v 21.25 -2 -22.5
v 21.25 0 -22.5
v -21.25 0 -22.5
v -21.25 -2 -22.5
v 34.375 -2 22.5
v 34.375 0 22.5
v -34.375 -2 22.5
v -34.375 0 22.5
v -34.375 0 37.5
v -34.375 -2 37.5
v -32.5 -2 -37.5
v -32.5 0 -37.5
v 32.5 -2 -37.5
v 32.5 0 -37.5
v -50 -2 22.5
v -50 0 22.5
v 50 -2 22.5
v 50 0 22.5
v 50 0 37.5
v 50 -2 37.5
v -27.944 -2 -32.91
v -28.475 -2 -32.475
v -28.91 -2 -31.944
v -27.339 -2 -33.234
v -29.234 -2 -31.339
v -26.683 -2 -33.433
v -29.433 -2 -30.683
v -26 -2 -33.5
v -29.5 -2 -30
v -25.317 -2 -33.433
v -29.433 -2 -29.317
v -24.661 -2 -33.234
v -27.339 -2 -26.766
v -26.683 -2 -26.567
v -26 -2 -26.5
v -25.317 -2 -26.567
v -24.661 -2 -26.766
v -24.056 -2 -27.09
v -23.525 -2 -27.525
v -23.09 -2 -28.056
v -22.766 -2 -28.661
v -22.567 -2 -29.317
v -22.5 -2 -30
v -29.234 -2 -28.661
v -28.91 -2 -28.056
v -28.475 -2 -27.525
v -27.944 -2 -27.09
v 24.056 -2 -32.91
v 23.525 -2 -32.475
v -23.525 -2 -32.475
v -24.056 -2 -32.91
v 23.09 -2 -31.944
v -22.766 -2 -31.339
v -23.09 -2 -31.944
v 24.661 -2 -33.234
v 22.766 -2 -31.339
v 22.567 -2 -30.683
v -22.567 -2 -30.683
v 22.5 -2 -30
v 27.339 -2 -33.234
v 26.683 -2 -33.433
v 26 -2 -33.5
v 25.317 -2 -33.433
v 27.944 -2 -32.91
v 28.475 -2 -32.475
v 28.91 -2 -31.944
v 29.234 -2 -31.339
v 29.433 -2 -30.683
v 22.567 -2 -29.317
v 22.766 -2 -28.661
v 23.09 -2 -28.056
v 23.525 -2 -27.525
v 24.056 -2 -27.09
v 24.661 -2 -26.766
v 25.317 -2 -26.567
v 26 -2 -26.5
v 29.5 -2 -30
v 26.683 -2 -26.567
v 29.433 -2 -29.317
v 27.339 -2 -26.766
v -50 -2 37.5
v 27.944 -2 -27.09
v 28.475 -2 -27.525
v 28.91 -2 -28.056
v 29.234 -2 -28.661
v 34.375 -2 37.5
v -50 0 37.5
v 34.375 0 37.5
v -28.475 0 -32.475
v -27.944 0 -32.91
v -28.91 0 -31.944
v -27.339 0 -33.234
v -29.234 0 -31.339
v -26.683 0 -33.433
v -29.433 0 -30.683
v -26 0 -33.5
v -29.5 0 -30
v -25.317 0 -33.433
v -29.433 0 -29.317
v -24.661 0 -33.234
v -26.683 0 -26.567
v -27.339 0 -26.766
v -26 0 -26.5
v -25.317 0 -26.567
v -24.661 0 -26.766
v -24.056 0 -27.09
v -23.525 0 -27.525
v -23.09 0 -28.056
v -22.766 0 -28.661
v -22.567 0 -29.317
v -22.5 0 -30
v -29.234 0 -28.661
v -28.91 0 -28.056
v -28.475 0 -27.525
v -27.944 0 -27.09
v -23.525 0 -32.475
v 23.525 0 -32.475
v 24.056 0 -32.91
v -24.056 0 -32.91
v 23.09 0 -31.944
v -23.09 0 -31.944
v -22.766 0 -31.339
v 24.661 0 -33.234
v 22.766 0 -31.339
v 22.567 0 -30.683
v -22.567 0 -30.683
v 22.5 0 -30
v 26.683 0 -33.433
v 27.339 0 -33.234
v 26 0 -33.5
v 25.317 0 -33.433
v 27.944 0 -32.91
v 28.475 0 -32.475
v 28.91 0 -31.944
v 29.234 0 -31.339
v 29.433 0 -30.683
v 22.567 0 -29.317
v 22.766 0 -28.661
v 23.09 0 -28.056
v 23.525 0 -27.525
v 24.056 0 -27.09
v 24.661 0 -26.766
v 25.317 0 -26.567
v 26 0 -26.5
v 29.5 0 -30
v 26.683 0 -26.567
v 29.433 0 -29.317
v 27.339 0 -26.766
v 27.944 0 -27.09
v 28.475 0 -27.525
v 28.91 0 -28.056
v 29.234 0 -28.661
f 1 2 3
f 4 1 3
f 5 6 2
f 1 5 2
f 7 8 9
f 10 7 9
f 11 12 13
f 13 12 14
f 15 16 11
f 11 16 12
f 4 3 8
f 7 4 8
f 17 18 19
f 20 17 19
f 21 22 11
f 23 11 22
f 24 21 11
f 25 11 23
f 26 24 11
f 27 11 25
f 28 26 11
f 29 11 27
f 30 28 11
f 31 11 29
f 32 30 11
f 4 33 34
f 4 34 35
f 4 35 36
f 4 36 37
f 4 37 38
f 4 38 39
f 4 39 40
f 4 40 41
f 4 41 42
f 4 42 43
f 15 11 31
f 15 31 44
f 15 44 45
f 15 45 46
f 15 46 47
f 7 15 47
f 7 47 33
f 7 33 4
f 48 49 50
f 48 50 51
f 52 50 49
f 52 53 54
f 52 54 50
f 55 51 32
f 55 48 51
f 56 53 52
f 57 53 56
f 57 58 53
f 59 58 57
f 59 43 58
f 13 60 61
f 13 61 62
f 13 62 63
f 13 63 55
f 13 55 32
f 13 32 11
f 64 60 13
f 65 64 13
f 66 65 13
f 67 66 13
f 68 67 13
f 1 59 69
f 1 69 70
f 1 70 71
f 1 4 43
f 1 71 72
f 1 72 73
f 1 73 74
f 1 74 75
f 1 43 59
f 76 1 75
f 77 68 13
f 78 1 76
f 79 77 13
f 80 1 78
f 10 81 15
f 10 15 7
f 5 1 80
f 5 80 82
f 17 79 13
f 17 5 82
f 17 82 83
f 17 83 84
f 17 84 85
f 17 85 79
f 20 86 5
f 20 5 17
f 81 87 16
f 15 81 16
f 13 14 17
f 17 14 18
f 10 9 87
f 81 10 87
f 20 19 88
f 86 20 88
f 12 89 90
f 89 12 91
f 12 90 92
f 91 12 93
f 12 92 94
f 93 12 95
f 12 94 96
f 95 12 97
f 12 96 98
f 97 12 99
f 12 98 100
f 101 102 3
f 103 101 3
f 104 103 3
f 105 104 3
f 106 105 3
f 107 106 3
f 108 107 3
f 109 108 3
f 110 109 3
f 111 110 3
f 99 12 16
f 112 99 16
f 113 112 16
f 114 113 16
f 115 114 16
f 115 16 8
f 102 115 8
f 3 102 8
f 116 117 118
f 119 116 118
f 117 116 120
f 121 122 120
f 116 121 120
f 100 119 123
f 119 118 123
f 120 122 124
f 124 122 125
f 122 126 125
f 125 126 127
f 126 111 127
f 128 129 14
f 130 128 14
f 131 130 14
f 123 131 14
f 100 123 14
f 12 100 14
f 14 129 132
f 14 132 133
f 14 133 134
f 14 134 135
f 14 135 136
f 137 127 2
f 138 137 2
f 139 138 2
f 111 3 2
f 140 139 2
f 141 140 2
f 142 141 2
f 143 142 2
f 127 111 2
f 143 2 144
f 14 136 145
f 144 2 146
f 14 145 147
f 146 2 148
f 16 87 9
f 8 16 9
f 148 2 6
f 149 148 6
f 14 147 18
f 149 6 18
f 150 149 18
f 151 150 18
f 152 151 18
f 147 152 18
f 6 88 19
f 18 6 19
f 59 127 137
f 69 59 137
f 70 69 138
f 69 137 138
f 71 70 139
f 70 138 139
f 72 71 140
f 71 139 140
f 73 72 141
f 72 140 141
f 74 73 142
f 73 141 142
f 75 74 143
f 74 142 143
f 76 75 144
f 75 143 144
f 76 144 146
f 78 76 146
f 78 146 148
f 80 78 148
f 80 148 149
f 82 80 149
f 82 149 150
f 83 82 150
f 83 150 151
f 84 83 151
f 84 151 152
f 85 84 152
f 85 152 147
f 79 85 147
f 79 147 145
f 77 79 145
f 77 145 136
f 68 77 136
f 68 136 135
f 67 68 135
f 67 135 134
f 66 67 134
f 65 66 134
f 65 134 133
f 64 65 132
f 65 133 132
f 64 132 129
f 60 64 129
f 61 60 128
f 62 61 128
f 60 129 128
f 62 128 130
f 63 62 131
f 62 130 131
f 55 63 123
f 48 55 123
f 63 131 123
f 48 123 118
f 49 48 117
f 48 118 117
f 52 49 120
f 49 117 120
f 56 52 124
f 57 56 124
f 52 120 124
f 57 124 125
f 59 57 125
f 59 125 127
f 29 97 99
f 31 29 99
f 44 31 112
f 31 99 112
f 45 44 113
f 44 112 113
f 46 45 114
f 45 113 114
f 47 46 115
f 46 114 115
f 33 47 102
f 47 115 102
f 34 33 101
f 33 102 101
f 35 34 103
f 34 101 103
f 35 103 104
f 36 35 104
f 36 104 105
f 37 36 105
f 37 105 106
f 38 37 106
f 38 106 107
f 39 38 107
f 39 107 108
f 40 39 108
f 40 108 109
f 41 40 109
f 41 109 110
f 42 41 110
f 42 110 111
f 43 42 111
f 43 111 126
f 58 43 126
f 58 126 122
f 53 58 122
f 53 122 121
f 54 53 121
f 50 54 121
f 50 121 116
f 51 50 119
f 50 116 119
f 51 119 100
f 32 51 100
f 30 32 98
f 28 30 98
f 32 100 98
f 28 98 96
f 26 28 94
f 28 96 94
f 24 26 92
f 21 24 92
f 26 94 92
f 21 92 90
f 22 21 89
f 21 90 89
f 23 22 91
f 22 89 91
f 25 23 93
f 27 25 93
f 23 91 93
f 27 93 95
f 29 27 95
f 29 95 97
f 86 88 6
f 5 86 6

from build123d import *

# Parameters (mm, degrees)
F1_DEPTH = 2
F3_D     = 7


with BuildPart() as f1:
    # F0 (on Front) → F1 (new body)
    with BuildSketch(Plane.XZ):
        Polygon((-50, 22.5), (-32.5, -37.5), (32.5, -37.5), (50, 22.5), (50, 37.5), (34.375, 37.5), (34.375, 22.5), (21.25, -22.5), (-21.25, -22.5), (-34.375, 22.5), (-34.375, 37.5), (-50, 37.5), align=None)
    extrude(amount=F1_DEPTH)

    # F3 (through all)
    with Locations(Plane.XZ.offset(2)):
        with Locations((-26, -30), (26, -30)):
            Hole(F3_D / 2)


solid = f1.part
